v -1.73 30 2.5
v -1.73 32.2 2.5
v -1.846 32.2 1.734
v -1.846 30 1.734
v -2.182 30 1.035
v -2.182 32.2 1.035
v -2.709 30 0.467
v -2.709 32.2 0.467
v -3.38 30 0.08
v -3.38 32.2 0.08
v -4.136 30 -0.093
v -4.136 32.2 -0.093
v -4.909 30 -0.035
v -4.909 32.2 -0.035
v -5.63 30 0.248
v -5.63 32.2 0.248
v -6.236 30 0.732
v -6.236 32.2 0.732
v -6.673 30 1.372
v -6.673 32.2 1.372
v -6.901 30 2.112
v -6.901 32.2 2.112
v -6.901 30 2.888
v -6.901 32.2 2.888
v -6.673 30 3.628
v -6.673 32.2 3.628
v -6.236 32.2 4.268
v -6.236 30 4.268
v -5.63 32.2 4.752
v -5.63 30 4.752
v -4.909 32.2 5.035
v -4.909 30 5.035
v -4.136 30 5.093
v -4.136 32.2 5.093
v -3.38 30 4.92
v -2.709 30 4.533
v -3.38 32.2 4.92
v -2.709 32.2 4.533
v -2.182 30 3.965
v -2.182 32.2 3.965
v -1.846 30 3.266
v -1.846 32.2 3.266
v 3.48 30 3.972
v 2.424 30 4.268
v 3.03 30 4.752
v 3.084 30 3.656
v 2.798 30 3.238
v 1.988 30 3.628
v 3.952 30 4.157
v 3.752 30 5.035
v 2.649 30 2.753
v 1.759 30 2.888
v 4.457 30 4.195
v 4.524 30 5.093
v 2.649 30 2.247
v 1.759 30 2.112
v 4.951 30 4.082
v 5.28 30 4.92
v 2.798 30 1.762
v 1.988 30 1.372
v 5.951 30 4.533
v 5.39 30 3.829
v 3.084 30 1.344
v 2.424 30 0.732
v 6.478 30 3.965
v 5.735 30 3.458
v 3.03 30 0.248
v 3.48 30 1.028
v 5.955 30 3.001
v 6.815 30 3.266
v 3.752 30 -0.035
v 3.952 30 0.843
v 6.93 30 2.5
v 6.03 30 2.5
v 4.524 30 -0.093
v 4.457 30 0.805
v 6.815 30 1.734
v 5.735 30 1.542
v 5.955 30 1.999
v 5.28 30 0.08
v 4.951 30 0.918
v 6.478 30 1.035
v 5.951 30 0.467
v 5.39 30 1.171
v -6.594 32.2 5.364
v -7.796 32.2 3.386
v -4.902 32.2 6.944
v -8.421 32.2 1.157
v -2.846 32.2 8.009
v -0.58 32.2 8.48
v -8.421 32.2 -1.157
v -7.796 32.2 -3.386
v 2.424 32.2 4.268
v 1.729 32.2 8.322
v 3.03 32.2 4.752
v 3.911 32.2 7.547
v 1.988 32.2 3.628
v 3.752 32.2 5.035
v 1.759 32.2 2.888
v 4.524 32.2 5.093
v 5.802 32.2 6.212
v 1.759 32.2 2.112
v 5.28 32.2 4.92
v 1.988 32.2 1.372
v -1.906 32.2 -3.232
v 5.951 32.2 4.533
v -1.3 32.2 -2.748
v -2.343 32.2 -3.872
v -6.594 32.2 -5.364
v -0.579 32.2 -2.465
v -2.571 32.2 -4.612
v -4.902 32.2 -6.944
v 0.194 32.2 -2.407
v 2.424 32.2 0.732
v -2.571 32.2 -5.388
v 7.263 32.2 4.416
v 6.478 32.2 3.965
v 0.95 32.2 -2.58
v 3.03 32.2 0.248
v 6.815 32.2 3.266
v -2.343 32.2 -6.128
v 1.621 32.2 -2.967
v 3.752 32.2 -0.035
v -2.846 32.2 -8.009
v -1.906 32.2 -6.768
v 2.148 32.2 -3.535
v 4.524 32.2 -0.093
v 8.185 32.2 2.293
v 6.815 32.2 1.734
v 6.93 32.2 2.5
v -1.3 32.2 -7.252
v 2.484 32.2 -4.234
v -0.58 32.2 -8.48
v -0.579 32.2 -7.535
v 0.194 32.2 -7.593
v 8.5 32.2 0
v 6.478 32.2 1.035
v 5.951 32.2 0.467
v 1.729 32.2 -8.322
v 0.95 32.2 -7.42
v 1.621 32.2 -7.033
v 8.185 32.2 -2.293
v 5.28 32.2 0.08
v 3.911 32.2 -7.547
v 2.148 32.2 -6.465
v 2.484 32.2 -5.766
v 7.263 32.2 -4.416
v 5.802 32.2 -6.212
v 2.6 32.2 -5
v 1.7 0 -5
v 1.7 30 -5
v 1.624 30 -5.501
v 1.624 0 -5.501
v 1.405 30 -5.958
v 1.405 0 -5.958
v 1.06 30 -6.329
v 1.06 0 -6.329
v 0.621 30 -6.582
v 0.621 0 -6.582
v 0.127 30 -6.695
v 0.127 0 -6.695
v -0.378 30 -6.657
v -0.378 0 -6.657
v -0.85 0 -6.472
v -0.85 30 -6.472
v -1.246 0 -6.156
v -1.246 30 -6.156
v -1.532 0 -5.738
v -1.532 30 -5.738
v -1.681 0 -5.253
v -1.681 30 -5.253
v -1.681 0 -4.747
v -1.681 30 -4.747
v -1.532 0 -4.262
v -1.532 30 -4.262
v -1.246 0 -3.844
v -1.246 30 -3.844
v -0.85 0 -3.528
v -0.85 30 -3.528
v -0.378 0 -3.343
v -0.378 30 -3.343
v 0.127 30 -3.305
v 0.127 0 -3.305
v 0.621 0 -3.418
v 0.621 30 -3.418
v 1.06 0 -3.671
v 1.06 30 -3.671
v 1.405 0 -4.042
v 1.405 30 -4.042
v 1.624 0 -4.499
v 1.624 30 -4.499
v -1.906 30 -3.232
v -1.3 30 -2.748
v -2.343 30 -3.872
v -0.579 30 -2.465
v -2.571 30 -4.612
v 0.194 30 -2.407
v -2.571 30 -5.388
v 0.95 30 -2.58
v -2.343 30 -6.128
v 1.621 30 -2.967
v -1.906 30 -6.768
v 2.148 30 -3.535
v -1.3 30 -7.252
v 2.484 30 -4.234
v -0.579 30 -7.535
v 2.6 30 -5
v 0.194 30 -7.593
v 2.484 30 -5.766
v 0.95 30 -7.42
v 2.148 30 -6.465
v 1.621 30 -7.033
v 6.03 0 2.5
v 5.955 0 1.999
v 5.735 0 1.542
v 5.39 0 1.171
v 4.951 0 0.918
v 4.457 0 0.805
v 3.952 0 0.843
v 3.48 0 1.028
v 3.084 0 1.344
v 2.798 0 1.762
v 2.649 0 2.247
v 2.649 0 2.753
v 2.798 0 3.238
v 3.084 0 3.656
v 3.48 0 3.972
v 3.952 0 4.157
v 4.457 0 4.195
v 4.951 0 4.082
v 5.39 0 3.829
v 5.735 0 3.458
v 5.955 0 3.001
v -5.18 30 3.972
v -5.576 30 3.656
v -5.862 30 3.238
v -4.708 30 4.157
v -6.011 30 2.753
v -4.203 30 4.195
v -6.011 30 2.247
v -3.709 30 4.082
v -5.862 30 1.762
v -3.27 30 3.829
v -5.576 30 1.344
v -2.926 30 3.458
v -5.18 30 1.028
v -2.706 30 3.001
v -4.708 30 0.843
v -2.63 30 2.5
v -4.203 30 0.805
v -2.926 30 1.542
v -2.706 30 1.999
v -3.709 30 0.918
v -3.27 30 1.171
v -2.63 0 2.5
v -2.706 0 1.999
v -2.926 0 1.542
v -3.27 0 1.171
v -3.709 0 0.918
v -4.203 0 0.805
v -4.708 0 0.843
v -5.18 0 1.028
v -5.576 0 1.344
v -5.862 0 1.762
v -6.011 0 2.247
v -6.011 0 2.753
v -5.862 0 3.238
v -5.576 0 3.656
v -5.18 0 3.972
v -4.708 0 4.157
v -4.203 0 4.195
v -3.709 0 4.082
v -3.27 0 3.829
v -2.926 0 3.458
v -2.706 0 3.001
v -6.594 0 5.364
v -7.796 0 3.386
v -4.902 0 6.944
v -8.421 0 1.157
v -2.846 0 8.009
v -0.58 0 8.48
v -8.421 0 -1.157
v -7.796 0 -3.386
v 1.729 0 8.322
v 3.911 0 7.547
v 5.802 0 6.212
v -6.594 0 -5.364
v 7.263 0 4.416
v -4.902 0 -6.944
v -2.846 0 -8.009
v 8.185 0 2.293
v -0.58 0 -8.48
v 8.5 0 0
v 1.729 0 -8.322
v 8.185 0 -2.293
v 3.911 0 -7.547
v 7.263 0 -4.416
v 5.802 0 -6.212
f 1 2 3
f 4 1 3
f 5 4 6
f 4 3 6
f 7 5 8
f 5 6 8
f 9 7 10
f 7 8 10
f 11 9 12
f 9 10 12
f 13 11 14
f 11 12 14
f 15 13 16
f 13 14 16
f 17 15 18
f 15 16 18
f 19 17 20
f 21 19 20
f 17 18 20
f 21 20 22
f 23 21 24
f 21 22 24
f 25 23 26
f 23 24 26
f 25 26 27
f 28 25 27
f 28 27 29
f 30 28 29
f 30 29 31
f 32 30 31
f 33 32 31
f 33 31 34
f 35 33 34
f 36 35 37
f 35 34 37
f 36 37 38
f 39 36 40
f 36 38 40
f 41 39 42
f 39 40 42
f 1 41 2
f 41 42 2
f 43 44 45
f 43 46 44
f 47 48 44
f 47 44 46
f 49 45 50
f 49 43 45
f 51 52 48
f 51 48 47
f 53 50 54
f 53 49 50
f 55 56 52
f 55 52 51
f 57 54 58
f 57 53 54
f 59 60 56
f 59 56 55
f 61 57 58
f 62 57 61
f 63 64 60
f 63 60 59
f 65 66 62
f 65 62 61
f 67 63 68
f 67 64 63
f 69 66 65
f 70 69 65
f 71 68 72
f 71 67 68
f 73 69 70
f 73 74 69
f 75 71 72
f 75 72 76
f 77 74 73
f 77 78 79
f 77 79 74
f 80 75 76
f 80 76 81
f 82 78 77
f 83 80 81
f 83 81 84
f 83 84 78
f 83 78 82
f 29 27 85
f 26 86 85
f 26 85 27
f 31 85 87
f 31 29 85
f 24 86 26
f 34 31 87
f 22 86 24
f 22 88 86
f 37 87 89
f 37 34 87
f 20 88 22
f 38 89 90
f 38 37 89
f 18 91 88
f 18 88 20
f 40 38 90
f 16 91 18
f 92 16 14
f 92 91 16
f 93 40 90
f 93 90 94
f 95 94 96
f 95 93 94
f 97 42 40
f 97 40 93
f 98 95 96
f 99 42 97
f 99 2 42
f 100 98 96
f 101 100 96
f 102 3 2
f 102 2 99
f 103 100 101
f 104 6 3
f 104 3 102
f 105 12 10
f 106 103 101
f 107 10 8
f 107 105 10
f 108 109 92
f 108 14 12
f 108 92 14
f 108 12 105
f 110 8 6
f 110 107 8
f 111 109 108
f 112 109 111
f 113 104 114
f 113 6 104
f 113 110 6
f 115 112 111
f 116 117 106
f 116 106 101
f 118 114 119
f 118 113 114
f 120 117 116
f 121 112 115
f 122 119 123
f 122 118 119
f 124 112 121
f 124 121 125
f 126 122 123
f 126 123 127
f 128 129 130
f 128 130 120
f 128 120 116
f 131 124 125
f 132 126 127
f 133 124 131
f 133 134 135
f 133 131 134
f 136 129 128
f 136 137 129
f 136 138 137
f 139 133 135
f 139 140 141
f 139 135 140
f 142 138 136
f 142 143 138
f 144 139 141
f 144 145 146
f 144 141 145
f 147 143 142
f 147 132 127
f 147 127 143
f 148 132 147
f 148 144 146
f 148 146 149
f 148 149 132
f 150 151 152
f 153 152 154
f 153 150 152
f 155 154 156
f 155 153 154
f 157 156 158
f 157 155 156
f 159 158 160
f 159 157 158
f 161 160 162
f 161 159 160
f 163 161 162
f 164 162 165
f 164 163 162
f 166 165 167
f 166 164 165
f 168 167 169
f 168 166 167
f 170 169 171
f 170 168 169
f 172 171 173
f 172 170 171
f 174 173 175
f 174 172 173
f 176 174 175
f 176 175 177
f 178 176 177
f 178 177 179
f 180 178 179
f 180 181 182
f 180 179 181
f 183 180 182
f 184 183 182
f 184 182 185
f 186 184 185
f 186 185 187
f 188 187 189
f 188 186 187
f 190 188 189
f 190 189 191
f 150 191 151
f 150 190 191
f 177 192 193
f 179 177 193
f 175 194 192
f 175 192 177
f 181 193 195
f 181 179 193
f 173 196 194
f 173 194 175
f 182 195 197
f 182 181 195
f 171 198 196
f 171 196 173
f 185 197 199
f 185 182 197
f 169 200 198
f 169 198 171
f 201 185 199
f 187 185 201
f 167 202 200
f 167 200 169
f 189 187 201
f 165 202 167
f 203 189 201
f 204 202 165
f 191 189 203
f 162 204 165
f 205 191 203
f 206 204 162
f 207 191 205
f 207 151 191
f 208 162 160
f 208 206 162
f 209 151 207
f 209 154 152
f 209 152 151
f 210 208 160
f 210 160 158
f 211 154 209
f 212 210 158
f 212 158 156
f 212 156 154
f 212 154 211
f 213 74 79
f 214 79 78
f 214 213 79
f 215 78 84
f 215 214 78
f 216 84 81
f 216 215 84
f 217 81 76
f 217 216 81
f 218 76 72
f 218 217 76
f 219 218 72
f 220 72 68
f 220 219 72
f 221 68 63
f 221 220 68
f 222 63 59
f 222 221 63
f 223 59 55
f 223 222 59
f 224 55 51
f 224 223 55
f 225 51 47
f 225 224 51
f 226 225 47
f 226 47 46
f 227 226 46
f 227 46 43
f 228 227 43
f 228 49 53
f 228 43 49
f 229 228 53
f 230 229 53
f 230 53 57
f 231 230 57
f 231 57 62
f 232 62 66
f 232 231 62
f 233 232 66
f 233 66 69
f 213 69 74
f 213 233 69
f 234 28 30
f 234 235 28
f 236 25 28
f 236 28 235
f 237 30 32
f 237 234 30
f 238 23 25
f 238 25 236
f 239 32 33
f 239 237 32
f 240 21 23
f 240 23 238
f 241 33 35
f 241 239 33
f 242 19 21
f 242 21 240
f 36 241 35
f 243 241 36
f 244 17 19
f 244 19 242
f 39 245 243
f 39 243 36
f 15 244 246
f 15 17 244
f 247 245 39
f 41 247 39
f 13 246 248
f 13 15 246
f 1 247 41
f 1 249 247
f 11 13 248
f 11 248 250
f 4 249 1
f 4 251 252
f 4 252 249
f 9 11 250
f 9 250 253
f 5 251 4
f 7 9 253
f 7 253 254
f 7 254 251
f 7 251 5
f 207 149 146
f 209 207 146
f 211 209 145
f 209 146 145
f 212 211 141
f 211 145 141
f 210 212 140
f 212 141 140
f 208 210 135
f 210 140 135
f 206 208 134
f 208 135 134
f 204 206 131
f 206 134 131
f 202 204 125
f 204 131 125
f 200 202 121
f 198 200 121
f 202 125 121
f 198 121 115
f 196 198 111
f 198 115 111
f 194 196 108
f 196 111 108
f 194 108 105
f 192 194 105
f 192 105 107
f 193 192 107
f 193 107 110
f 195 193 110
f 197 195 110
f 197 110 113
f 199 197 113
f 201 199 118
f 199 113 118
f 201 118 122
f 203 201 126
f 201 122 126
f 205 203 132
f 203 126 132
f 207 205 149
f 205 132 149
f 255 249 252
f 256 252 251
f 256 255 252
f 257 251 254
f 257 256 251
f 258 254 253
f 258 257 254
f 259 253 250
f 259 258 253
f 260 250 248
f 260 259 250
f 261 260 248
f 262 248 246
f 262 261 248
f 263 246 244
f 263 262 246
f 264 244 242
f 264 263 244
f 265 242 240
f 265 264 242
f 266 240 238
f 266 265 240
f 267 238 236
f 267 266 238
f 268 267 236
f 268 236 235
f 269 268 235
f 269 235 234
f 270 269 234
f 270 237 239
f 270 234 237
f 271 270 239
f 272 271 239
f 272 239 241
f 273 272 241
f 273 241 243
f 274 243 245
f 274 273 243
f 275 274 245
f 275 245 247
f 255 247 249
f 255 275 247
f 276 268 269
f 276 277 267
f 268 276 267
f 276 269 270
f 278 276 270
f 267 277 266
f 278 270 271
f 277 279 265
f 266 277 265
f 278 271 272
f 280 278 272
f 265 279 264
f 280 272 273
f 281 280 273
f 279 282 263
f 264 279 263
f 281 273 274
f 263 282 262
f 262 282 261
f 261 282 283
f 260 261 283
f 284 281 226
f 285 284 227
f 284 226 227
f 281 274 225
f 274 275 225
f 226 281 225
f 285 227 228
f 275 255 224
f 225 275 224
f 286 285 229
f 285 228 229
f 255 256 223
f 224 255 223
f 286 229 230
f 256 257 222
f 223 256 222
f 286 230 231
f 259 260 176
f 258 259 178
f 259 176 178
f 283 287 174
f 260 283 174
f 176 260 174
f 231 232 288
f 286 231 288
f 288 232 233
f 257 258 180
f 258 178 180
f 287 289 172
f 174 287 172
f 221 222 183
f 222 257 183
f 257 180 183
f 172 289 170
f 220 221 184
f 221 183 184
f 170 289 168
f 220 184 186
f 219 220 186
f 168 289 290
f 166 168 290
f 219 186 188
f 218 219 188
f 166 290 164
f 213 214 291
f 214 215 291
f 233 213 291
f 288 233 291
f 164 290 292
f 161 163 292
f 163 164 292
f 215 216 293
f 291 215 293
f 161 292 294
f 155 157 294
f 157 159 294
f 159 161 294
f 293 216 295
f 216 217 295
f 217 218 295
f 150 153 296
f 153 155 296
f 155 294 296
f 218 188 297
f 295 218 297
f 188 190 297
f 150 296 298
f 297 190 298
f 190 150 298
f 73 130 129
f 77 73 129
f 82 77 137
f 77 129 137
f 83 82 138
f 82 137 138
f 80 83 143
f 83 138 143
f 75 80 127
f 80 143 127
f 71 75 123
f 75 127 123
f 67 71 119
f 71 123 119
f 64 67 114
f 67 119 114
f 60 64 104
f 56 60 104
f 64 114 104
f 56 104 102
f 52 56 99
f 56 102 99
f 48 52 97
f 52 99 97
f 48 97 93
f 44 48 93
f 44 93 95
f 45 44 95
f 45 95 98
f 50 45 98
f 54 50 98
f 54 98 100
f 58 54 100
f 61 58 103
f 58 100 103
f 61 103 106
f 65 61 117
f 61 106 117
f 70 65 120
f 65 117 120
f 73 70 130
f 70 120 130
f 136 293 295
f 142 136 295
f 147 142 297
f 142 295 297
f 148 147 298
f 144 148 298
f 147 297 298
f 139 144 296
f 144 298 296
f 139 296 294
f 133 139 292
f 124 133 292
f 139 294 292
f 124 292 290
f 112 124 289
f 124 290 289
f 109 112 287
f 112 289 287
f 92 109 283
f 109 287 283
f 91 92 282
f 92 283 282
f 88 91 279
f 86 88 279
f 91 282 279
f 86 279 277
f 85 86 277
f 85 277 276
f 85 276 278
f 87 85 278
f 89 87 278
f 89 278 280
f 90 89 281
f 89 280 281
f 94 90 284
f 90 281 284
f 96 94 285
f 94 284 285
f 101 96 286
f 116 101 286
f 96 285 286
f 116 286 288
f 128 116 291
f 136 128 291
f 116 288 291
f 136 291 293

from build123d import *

# Parameters (mm, degrees)
SKETCH1_R           = 8.5
SKETCH1_R_2         = 1.7
BOSS_EXTRUDE1_DEPTH = 32.2
SKETCH2_R           = 2.6
CUT_EXTRUDE1_DEPTH  = 2.2


with BuildPart() as part:
    # Sketch1 → Boss-Extrude1 (new body)
    with BuildSketch(Plane(origin=(0, 0, 0), x_dir=(1, 0, 0), z_dir=(0, 1, 0))):
        Circle(SKETCH1_R)
        with Locations((0, 5)):
            Circle(SKETCH1_R_2, mode=Mode.SUBTRACT)
        with Locations((4.330127019, -2.5)):
            Circle(SKETCH1_R_2, mode=Mode.SUBTRACT)
        with Locations((-4.330127019, -2.5)):
            Circle(SKETCH1_R_2, mode=Mode.SUBTRACT)
    extrude(amount=BOSS_EXTRUDE1_DEPTH)

    # Sketch2 → Cut-Extrude1 (cut)
    with BuildSketch(Plane(origin=(0, 32.2, 0), x_dir=(1, 0, 0), z_dir=(0, 1, 0))):
        with Locations((0, 5)):
            Circle(SKETCH2_R)
        with Locations((4.330127019, -2.5)):
            Circle(SKETCH2_R)
        with Locations((-4.330127019, -2.5)):
            Circle(SKETCH2_R)
    extrude(amount=-CUT_EXTRUDE1_DEPTH, mode=Mode.SUBTRACT)


solid = part.part
